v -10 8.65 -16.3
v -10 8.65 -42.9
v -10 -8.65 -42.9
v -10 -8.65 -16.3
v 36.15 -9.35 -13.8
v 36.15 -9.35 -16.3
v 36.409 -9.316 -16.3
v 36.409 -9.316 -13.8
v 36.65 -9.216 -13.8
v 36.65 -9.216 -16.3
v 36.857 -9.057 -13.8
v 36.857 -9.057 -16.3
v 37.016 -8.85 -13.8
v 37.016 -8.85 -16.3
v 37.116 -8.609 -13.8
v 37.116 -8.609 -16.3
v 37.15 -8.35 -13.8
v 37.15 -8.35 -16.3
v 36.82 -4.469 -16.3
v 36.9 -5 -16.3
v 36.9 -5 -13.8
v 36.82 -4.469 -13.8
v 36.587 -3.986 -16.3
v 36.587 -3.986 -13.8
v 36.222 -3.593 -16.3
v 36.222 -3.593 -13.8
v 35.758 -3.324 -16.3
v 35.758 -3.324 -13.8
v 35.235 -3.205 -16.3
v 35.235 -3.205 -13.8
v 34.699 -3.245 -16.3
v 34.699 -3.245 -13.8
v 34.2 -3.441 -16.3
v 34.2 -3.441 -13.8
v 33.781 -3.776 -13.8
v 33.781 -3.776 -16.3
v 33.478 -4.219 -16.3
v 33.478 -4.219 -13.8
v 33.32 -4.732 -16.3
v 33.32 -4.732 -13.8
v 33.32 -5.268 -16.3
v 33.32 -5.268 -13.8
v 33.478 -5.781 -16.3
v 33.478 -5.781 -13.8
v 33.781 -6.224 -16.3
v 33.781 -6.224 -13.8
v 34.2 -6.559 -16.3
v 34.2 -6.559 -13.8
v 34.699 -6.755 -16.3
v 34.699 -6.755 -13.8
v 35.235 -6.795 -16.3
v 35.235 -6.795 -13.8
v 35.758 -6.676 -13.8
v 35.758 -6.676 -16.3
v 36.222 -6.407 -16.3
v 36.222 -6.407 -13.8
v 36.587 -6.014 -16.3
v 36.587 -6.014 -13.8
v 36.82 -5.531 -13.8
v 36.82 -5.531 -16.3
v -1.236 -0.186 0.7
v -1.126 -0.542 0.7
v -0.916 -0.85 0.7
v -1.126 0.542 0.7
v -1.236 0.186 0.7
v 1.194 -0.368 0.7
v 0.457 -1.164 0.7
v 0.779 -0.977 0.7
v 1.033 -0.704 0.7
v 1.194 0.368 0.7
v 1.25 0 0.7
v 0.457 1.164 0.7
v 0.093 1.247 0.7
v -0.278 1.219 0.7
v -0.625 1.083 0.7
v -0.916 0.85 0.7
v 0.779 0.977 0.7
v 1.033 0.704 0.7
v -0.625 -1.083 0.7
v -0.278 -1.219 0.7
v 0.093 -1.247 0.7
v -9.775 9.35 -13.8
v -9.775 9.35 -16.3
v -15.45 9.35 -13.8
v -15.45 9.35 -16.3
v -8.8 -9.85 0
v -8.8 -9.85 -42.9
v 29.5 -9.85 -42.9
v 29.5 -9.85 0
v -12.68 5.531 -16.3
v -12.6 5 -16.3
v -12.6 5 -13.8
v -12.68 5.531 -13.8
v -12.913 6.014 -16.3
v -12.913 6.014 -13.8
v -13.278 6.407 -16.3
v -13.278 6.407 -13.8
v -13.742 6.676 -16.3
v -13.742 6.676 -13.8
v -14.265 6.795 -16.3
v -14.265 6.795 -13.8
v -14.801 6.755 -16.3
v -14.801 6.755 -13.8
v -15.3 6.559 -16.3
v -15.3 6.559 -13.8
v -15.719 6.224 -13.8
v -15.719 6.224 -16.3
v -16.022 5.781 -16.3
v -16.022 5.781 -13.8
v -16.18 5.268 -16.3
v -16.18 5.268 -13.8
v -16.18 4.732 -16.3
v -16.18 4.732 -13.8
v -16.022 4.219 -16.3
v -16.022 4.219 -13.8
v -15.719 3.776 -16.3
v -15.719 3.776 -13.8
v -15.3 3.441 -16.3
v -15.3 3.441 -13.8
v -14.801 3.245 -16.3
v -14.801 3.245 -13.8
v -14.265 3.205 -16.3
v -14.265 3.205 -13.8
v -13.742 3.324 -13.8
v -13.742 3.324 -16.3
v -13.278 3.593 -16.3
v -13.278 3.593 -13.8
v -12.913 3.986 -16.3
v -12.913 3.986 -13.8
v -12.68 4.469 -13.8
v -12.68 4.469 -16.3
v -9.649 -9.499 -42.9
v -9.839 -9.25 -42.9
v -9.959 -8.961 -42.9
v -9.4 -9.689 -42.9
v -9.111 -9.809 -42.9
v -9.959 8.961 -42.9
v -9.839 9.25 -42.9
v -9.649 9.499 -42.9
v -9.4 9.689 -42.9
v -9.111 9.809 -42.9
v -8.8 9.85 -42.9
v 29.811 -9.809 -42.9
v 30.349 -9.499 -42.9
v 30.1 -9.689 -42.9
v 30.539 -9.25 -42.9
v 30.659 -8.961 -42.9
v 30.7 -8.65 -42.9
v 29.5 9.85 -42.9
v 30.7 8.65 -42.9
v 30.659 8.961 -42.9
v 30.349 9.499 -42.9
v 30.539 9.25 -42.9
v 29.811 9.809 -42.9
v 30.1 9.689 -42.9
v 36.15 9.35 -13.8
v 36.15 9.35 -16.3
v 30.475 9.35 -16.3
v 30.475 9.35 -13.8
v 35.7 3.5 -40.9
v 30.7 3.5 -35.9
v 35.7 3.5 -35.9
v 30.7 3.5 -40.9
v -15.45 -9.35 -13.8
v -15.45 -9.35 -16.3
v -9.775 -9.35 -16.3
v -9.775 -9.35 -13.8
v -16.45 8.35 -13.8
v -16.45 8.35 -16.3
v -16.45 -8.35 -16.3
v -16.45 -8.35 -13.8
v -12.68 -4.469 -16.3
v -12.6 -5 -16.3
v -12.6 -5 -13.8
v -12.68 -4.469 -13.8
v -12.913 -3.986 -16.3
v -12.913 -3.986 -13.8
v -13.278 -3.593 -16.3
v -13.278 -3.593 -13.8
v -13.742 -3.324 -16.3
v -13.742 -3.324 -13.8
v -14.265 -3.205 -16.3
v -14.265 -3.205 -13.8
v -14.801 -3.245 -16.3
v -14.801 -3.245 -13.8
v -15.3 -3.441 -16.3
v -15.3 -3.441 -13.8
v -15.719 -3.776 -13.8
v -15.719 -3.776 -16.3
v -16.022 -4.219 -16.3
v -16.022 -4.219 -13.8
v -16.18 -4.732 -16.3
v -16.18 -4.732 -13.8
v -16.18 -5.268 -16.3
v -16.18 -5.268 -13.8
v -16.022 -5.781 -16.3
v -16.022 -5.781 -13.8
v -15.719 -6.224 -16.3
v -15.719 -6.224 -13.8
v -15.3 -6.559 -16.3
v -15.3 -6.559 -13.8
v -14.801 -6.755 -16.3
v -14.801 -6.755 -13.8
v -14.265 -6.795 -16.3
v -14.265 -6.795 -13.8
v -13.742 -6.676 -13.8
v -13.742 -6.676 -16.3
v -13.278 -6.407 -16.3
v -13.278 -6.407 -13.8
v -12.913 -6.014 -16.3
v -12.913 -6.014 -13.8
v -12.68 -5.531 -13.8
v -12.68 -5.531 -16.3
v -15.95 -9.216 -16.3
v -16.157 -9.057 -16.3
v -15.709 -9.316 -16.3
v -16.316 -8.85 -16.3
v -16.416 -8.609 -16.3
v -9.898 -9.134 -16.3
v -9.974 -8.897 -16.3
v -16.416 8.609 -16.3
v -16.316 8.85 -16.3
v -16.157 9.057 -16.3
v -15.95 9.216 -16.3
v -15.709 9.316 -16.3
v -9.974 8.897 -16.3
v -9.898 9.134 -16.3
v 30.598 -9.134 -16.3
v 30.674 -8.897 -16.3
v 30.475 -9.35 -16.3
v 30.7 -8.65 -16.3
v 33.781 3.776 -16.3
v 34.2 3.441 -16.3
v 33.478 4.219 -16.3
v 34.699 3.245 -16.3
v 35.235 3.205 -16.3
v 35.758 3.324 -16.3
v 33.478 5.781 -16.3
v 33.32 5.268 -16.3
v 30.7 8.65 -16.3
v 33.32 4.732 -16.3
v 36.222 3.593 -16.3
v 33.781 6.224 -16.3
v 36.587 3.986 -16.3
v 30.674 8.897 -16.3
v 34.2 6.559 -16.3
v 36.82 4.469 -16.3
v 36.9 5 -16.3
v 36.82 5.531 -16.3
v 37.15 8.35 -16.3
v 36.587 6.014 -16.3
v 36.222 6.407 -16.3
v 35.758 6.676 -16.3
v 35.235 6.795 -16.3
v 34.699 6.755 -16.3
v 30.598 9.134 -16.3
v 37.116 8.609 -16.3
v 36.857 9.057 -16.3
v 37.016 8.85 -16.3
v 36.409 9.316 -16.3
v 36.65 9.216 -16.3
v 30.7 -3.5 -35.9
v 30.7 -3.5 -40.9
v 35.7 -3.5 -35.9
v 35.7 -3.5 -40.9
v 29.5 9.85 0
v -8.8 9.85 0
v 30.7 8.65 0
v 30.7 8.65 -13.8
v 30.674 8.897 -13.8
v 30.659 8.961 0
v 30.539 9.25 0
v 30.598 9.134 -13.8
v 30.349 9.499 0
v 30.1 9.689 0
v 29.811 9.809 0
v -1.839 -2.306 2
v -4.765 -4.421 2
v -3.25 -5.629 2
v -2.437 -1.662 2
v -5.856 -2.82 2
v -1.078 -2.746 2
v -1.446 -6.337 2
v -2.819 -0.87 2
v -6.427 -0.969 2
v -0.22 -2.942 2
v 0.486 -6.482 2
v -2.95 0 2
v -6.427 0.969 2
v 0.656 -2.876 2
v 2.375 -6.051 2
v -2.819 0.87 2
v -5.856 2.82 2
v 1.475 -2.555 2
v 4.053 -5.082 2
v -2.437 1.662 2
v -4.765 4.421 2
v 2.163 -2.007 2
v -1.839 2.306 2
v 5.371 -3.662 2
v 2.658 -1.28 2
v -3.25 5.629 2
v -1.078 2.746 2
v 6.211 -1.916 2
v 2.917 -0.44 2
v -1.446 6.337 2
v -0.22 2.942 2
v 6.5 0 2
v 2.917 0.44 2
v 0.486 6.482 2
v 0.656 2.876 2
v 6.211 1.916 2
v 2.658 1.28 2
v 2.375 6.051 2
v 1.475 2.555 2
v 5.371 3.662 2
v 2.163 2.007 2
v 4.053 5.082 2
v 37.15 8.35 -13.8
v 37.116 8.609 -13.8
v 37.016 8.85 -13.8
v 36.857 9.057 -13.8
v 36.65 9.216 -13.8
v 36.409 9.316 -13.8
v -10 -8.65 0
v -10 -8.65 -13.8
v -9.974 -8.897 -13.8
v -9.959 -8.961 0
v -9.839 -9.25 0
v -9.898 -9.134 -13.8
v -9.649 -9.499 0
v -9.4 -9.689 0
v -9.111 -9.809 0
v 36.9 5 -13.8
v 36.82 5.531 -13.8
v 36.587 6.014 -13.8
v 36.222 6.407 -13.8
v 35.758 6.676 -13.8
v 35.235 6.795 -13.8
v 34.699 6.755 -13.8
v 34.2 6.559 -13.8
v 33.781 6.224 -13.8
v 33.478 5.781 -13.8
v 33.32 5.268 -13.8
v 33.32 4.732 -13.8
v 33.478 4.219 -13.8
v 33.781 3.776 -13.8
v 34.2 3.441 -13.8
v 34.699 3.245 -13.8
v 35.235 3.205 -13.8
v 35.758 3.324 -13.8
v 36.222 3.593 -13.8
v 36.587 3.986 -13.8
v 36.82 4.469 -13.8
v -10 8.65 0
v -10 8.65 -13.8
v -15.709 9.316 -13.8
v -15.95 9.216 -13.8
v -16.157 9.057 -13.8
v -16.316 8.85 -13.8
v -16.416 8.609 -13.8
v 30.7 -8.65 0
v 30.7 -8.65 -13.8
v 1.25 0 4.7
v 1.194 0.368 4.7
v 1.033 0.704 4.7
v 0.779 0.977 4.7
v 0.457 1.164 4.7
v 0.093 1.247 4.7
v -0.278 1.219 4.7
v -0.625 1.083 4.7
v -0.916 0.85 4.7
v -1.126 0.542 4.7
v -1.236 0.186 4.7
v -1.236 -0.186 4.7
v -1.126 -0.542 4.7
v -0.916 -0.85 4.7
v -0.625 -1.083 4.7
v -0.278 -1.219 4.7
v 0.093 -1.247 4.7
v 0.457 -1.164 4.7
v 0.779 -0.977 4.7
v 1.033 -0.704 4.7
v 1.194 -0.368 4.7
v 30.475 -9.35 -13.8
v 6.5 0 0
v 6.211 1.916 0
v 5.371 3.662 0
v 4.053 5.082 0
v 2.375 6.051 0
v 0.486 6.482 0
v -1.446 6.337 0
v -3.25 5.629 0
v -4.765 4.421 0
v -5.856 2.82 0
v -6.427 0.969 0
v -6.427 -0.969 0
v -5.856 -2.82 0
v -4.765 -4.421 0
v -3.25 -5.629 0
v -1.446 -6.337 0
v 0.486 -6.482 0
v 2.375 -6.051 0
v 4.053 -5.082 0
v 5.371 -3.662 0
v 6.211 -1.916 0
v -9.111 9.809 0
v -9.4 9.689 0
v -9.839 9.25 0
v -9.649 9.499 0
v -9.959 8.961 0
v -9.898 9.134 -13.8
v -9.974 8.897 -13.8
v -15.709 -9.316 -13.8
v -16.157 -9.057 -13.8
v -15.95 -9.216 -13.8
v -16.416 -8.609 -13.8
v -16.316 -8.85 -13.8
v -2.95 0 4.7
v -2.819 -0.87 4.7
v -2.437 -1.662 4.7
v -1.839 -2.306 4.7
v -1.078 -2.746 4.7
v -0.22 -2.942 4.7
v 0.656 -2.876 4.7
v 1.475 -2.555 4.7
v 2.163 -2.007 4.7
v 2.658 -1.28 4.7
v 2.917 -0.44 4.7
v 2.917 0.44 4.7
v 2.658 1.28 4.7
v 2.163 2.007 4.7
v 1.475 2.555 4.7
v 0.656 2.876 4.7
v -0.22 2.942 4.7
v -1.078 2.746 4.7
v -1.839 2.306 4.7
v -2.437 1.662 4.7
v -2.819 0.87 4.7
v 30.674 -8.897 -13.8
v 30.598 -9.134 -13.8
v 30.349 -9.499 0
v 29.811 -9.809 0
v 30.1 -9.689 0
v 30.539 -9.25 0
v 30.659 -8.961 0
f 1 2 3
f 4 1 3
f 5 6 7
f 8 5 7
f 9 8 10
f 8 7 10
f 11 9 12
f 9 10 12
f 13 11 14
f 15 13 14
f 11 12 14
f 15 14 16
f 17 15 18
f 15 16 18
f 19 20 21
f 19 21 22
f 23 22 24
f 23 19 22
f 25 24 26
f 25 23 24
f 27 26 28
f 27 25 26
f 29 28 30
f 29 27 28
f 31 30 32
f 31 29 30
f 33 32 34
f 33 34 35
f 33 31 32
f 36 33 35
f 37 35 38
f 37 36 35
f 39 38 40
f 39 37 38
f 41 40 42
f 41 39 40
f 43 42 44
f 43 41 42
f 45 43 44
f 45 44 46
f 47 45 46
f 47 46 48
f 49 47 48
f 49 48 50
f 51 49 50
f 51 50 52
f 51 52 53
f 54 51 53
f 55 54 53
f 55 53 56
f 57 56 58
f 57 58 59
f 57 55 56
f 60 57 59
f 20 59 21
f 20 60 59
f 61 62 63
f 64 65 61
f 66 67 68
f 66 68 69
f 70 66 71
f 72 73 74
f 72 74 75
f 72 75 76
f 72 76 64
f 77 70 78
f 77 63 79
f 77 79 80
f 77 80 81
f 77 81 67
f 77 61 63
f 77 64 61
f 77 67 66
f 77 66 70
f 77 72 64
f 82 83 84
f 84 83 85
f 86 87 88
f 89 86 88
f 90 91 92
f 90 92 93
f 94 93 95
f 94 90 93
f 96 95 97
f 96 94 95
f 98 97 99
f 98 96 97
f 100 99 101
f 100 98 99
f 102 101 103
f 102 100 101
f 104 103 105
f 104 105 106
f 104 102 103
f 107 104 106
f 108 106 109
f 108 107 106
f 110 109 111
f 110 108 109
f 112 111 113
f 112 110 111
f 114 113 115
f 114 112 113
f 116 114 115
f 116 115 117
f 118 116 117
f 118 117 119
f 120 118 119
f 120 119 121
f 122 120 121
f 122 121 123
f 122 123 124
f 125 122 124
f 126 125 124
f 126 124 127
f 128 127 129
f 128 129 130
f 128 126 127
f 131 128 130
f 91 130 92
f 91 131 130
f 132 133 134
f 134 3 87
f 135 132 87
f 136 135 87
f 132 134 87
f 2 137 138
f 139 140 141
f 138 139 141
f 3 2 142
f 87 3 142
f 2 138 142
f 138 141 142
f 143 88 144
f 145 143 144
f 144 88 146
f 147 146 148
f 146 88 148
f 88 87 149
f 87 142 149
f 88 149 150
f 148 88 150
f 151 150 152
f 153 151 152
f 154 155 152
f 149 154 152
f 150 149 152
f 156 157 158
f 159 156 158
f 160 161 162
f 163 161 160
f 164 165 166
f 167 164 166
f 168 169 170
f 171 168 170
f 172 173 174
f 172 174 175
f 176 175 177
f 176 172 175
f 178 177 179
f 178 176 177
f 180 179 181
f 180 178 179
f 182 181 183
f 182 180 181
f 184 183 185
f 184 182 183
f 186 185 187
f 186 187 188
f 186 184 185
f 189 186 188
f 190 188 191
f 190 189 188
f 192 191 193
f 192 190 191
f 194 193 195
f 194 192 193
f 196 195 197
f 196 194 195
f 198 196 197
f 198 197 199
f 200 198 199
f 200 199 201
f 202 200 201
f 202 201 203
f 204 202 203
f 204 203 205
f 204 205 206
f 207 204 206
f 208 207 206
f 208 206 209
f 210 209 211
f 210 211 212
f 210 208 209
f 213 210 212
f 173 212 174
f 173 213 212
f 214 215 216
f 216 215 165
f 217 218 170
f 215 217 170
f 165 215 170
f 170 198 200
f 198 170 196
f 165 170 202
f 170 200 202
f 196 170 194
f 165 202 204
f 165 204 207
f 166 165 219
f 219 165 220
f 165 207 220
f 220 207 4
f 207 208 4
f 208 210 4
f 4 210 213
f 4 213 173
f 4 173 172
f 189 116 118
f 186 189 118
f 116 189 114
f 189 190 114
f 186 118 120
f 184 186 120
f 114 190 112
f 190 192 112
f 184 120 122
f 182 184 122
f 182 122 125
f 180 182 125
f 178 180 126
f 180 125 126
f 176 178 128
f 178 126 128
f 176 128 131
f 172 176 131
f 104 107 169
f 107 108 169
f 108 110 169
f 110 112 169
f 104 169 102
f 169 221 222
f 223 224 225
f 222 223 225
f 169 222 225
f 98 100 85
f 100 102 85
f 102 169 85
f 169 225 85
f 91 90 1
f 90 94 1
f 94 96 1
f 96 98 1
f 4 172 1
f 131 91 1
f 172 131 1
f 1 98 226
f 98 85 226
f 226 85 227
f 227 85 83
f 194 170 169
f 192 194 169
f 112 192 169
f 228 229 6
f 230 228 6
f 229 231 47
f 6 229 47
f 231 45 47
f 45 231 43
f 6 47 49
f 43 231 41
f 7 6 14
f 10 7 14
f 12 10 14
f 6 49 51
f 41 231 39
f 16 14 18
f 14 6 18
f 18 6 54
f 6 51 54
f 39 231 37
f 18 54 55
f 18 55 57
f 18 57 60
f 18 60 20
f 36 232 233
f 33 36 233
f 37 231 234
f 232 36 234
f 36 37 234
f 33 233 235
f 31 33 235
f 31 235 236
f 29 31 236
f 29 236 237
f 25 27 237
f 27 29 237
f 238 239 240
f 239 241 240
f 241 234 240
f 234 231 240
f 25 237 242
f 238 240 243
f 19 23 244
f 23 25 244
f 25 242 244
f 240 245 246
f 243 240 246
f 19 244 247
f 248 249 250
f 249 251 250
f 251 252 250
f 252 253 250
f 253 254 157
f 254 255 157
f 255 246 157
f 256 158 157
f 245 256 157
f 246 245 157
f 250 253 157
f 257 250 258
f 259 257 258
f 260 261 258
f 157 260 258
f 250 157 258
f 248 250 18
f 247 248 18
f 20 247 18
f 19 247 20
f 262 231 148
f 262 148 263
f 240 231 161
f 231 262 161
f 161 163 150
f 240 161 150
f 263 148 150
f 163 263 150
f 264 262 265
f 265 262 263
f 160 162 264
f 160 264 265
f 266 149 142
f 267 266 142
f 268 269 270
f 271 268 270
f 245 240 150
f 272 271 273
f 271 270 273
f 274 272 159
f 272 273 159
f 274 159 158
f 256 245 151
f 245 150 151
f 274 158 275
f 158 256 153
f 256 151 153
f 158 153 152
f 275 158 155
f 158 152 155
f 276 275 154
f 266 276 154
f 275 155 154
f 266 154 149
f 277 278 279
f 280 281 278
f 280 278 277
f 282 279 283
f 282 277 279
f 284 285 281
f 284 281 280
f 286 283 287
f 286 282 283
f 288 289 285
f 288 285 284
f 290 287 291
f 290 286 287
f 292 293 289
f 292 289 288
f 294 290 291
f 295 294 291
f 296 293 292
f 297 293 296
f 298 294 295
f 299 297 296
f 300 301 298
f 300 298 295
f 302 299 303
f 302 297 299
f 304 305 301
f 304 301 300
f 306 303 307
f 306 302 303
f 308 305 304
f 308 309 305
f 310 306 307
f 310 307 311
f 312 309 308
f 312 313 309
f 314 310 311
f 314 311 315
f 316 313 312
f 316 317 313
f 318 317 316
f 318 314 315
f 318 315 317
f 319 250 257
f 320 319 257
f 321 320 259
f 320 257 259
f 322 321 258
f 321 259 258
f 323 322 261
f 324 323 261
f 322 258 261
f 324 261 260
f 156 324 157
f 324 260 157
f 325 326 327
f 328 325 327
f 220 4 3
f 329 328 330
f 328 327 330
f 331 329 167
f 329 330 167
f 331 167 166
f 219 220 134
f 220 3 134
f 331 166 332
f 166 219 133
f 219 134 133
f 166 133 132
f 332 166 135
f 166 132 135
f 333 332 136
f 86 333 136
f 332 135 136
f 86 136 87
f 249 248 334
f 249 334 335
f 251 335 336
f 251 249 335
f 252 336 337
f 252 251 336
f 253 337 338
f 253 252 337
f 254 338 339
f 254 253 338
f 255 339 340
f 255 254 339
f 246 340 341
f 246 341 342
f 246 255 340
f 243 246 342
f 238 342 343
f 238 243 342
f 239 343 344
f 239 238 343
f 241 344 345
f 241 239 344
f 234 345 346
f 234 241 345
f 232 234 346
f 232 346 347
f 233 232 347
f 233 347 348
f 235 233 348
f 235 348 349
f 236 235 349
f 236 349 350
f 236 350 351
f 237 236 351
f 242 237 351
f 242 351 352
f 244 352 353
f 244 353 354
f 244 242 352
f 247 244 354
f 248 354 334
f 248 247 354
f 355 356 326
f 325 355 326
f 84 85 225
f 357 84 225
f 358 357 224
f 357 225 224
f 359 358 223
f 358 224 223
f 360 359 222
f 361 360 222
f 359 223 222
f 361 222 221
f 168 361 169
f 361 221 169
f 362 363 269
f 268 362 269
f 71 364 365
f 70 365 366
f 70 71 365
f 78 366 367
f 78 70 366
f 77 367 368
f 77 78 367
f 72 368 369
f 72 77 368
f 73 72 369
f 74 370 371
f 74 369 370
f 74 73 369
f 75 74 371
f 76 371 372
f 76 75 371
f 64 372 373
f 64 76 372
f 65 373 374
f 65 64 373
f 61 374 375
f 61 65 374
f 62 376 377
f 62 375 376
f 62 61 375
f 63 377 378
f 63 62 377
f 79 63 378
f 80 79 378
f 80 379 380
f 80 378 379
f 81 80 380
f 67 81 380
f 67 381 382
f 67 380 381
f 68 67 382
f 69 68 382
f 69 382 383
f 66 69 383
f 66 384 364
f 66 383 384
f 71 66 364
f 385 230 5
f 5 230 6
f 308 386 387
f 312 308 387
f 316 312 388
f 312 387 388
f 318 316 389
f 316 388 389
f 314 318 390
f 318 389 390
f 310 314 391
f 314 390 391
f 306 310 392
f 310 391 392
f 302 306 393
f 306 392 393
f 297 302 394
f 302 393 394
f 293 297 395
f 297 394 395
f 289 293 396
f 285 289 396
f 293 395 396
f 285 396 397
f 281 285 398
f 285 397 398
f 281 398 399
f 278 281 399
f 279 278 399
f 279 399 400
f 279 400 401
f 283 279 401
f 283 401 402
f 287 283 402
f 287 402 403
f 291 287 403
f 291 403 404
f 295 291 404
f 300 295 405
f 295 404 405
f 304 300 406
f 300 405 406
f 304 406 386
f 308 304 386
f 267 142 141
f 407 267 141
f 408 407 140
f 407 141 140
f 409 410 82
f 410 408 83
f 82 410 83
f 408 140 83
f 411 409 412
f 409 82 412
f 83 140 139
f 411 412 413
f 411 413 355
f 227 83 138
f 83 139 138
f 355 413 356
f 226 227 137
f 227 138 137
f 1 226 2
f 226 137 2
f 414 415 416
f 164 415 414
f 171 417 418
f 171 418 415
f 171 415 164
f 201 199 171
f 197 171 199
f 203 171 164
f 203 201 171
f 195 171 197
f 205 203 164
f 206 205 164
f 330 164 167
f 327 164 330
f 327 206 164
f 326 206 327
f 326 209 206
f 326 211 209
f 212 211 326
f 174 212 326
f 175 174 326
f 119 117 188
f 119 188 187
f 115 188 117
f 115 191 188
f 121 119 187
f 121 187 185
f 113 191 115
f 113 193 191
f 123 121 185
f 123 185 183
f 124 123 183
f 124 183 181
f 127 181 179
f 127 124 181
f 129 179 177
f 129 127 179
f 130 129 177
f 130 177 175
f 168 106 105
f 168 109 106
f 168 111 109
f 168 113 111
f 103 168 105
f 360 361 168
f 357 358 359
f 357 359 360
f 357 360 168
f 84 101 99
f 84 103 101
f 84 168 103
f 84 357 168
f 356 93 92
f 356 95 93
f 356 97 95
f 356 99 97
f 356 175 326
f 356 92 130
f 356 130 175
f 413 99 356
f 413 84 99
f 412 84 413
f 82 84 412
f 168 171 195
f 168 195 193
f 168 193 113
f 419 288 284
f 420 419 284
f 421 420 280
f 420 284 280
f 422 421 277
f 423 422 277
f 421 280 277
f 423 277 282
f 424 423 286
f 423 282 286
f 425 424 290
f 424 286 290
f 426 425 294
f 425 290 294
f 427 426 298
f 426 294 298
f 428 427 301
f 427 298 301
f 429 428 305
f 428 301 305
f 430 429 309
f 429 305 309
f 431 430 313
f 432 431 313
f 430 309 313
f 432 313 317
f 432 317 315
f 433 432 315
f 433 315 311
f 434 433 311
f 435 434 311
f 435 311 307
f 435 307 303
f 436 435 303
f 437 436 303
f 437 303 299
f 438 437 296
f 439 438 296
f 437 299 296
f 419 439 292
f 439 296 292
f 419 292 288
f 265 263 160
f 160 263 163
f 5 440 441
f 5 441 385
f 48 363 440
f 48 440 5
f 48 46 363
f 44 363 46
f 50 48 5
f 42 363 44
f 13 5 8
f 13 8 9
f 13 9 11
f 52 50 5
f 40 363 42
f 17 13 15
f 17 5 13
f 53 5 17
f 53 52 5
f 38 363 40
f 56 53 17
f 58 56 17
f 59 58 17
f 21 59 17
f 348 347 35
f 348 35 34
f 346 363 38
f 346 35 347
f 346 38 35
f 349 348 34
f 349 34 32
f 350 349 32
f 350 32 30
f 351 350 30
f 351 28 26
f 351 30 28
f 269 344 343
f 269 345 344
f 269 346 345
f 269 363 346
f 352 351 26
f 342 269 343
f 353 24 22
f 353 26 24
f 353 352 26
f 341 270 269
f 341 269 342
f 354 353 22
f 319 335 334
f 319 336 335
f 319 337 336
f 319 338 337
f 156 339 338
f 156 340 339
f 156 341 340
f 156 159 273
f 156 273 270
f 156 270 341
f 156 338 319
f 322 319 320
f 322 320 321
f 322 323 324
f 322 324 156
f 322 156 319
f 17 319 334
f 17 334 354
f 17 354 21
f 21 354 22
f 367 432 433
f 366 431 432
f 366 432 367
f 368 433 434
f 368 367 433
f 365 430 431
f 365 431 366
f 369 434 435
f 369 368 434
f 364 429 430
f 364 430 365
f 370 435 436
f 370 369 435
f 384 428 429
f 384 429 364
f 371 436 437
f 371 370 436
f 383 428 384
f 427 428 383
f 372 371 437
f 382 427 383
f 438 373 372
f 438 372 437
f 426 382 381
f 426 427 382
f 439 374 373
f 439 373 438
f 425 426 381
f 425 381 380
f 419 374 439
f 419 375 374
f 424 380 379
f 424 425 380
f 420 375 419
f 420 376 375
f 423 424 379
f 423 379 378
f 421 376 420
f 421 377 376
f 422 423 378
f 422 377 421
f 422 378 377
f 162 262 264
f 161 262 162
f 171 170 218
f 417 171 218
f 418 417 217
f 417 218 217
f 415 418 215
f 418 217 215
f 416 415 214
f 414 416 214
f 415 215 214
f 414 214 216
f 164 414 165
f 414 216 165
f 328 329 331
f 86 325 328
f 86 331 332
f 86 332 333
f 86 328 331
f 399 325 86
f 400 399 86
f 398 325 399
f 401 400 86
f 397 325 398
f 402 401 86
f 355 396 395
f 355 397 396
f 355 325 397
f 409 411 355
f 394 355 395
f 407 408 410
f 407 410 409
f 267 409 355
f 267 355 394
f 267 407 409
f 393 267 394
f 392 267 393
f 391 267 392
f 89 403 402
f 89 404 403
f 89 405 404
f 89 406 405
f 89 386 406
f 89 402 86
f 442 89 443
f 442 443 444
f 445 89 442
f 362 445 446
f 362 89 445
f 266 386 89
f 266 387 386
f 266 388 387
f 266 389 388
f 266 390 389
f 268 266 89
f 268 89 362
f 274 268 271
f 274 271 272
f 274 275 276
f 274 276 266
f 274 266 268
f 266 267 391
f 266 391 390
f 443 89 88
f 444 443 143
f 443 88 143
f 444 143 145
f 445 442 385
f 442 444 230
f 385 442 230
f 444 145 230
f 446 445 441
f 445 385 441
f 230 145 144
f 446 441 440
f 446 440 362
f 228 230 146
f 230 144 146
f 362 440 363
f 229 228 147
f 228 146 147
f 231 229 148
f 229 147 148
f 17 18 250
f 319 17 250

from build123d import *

# Parameters (mm, degrees)
CASE_START   = -42.9
CASE_2_DEPTH = 42.9
TABS_START   = -16.3
SKETCH2_R    = 1.8
TABS_DEPTH   = 2.5
SKETCH3_R    = 6.5
BOSS_DEPTH   = 2
SPLINE_START = 2
SKETCH4_R    = 2.95
SPLINE_DEPTH = 2.7
M3_START     = 0.7
SKETCH5_R    = 1.25
M3_TAP_DEPTH = 4.1
LEAD_START   = 30.5
SKETCH6_W    = 5
SKETCH6_H    = 7
LEAD_DEPTH   = 5.2


with BuildPart() as part:
    # Sketch1 → Case 2 (new body)
    with BuildSketch(Plane.XY.offset(CASE_START)):
        with BuildLine():
            Line((-8.8, -9.85), (29.5, -9.85))
            ThreePointArc((29.5, -9.85), (30.348528137, -9.498528137), (30.7, -8.65))
            Line((30.7, -8.65), (30.7, 8.65))
            ThreePointArc((30.7, 8.65), (30.348528137, 9.498528137), (29.5, 9.85))
            Line((29.5, 9.85), (-8.8, 9.85))
            ThreePointArc((-8.8, 9.85), (-9.648528137, 9.498528137), (-10, 8.65))
            Line((-10, 8.65), (-10, -8.65))
            ThreePointArc((-10, -8.65), (-9.648528137, -9.498528137), (-8.8, -9.85))
        make_face()
    extrude(amount=CASE_2_DEPTH)

    # Sketch2 → Tabs (add)
    with BuildSketch(Plane.XY.offset(TABS_START)):
        with BuildLine():
            Line((-15.45, -9.35), (36.15, -9.35))
            ThreePointArc((36.15, -9.35), (36.857106781, -9.057106781), (37.15, -8.35))
            Line((37.15, -8.35), (37.15, 8.35))
            ThreePointArc((37.15, 8.35), (36.857106781, 9.057106781), (36.15, 9.35))
            Line((36.15, 9.35), (-15.45, 9.35))
            ThreePointArc((-15.45, 9.35), (-16.157106781, 9.057106781), (-16.45, 8.35))
            Line((-16.45, 8.35), (-16.45, -8.35))
            ThreePointArc((-16.45, -8.35), (-16.157106781, -9.057106781), (-15.45, -9.35))
        make_face()
        with Locations((-14.4, -5)):
            Circle(SKETCH2_R, mode=Mode.SUBTRACT)
        with Locations((-14.4, 5)):
            Circle(SKETCH2_R, mode=Mode.SUBTRACT)
        with Locations((35.1, -5)):
            Circle(SKETCH2_R, mode=Mode.SUBTRACT)
        with Locations((35.1, 5)):
            Circle(SKETCH2_R, mode=Mode.SUBTRACT)
    extrude(amount=TABS_DEPTH)

    # Sketch3 → Boss (add)
    with BuildSketch(Plane.XY):
        Circle(SKETCH3_R)
    extrude(amount=BOSS_DEPTH)

    # Sketch4 → Spline (add)
    with BuildSketch(Plane.XY.offset(SPLINE_START)):
        with Locations(Location((0, 0, 0), (0, 0, 180))):
            Circle(SKETCH4_R)
    extrude(amount=SPLINE_DEPTH)

    # Sketch5 → M3 tap (cut)
    with BuildSketch(Plane.XY.offset(M3_START)):
        Circle(SKETCH5_R)
    extrude(amount=M3_TAP_DEPTH, mode=Mode.SUBTRACT)

    # Sketch6 → Lead (add)
    with BuildSketch(Plane(origin=(0, 0, 0), x_dir=(0, 0, -1), z_dir=(1, 0, 0)).offset(LEAD_START)):
        with Locations((38.4, 0)):
            Rectangle(SKETCH6_W, SKETCH6_H)
    extrude(amount=LEAD_DEPTH)


solid = part.part
